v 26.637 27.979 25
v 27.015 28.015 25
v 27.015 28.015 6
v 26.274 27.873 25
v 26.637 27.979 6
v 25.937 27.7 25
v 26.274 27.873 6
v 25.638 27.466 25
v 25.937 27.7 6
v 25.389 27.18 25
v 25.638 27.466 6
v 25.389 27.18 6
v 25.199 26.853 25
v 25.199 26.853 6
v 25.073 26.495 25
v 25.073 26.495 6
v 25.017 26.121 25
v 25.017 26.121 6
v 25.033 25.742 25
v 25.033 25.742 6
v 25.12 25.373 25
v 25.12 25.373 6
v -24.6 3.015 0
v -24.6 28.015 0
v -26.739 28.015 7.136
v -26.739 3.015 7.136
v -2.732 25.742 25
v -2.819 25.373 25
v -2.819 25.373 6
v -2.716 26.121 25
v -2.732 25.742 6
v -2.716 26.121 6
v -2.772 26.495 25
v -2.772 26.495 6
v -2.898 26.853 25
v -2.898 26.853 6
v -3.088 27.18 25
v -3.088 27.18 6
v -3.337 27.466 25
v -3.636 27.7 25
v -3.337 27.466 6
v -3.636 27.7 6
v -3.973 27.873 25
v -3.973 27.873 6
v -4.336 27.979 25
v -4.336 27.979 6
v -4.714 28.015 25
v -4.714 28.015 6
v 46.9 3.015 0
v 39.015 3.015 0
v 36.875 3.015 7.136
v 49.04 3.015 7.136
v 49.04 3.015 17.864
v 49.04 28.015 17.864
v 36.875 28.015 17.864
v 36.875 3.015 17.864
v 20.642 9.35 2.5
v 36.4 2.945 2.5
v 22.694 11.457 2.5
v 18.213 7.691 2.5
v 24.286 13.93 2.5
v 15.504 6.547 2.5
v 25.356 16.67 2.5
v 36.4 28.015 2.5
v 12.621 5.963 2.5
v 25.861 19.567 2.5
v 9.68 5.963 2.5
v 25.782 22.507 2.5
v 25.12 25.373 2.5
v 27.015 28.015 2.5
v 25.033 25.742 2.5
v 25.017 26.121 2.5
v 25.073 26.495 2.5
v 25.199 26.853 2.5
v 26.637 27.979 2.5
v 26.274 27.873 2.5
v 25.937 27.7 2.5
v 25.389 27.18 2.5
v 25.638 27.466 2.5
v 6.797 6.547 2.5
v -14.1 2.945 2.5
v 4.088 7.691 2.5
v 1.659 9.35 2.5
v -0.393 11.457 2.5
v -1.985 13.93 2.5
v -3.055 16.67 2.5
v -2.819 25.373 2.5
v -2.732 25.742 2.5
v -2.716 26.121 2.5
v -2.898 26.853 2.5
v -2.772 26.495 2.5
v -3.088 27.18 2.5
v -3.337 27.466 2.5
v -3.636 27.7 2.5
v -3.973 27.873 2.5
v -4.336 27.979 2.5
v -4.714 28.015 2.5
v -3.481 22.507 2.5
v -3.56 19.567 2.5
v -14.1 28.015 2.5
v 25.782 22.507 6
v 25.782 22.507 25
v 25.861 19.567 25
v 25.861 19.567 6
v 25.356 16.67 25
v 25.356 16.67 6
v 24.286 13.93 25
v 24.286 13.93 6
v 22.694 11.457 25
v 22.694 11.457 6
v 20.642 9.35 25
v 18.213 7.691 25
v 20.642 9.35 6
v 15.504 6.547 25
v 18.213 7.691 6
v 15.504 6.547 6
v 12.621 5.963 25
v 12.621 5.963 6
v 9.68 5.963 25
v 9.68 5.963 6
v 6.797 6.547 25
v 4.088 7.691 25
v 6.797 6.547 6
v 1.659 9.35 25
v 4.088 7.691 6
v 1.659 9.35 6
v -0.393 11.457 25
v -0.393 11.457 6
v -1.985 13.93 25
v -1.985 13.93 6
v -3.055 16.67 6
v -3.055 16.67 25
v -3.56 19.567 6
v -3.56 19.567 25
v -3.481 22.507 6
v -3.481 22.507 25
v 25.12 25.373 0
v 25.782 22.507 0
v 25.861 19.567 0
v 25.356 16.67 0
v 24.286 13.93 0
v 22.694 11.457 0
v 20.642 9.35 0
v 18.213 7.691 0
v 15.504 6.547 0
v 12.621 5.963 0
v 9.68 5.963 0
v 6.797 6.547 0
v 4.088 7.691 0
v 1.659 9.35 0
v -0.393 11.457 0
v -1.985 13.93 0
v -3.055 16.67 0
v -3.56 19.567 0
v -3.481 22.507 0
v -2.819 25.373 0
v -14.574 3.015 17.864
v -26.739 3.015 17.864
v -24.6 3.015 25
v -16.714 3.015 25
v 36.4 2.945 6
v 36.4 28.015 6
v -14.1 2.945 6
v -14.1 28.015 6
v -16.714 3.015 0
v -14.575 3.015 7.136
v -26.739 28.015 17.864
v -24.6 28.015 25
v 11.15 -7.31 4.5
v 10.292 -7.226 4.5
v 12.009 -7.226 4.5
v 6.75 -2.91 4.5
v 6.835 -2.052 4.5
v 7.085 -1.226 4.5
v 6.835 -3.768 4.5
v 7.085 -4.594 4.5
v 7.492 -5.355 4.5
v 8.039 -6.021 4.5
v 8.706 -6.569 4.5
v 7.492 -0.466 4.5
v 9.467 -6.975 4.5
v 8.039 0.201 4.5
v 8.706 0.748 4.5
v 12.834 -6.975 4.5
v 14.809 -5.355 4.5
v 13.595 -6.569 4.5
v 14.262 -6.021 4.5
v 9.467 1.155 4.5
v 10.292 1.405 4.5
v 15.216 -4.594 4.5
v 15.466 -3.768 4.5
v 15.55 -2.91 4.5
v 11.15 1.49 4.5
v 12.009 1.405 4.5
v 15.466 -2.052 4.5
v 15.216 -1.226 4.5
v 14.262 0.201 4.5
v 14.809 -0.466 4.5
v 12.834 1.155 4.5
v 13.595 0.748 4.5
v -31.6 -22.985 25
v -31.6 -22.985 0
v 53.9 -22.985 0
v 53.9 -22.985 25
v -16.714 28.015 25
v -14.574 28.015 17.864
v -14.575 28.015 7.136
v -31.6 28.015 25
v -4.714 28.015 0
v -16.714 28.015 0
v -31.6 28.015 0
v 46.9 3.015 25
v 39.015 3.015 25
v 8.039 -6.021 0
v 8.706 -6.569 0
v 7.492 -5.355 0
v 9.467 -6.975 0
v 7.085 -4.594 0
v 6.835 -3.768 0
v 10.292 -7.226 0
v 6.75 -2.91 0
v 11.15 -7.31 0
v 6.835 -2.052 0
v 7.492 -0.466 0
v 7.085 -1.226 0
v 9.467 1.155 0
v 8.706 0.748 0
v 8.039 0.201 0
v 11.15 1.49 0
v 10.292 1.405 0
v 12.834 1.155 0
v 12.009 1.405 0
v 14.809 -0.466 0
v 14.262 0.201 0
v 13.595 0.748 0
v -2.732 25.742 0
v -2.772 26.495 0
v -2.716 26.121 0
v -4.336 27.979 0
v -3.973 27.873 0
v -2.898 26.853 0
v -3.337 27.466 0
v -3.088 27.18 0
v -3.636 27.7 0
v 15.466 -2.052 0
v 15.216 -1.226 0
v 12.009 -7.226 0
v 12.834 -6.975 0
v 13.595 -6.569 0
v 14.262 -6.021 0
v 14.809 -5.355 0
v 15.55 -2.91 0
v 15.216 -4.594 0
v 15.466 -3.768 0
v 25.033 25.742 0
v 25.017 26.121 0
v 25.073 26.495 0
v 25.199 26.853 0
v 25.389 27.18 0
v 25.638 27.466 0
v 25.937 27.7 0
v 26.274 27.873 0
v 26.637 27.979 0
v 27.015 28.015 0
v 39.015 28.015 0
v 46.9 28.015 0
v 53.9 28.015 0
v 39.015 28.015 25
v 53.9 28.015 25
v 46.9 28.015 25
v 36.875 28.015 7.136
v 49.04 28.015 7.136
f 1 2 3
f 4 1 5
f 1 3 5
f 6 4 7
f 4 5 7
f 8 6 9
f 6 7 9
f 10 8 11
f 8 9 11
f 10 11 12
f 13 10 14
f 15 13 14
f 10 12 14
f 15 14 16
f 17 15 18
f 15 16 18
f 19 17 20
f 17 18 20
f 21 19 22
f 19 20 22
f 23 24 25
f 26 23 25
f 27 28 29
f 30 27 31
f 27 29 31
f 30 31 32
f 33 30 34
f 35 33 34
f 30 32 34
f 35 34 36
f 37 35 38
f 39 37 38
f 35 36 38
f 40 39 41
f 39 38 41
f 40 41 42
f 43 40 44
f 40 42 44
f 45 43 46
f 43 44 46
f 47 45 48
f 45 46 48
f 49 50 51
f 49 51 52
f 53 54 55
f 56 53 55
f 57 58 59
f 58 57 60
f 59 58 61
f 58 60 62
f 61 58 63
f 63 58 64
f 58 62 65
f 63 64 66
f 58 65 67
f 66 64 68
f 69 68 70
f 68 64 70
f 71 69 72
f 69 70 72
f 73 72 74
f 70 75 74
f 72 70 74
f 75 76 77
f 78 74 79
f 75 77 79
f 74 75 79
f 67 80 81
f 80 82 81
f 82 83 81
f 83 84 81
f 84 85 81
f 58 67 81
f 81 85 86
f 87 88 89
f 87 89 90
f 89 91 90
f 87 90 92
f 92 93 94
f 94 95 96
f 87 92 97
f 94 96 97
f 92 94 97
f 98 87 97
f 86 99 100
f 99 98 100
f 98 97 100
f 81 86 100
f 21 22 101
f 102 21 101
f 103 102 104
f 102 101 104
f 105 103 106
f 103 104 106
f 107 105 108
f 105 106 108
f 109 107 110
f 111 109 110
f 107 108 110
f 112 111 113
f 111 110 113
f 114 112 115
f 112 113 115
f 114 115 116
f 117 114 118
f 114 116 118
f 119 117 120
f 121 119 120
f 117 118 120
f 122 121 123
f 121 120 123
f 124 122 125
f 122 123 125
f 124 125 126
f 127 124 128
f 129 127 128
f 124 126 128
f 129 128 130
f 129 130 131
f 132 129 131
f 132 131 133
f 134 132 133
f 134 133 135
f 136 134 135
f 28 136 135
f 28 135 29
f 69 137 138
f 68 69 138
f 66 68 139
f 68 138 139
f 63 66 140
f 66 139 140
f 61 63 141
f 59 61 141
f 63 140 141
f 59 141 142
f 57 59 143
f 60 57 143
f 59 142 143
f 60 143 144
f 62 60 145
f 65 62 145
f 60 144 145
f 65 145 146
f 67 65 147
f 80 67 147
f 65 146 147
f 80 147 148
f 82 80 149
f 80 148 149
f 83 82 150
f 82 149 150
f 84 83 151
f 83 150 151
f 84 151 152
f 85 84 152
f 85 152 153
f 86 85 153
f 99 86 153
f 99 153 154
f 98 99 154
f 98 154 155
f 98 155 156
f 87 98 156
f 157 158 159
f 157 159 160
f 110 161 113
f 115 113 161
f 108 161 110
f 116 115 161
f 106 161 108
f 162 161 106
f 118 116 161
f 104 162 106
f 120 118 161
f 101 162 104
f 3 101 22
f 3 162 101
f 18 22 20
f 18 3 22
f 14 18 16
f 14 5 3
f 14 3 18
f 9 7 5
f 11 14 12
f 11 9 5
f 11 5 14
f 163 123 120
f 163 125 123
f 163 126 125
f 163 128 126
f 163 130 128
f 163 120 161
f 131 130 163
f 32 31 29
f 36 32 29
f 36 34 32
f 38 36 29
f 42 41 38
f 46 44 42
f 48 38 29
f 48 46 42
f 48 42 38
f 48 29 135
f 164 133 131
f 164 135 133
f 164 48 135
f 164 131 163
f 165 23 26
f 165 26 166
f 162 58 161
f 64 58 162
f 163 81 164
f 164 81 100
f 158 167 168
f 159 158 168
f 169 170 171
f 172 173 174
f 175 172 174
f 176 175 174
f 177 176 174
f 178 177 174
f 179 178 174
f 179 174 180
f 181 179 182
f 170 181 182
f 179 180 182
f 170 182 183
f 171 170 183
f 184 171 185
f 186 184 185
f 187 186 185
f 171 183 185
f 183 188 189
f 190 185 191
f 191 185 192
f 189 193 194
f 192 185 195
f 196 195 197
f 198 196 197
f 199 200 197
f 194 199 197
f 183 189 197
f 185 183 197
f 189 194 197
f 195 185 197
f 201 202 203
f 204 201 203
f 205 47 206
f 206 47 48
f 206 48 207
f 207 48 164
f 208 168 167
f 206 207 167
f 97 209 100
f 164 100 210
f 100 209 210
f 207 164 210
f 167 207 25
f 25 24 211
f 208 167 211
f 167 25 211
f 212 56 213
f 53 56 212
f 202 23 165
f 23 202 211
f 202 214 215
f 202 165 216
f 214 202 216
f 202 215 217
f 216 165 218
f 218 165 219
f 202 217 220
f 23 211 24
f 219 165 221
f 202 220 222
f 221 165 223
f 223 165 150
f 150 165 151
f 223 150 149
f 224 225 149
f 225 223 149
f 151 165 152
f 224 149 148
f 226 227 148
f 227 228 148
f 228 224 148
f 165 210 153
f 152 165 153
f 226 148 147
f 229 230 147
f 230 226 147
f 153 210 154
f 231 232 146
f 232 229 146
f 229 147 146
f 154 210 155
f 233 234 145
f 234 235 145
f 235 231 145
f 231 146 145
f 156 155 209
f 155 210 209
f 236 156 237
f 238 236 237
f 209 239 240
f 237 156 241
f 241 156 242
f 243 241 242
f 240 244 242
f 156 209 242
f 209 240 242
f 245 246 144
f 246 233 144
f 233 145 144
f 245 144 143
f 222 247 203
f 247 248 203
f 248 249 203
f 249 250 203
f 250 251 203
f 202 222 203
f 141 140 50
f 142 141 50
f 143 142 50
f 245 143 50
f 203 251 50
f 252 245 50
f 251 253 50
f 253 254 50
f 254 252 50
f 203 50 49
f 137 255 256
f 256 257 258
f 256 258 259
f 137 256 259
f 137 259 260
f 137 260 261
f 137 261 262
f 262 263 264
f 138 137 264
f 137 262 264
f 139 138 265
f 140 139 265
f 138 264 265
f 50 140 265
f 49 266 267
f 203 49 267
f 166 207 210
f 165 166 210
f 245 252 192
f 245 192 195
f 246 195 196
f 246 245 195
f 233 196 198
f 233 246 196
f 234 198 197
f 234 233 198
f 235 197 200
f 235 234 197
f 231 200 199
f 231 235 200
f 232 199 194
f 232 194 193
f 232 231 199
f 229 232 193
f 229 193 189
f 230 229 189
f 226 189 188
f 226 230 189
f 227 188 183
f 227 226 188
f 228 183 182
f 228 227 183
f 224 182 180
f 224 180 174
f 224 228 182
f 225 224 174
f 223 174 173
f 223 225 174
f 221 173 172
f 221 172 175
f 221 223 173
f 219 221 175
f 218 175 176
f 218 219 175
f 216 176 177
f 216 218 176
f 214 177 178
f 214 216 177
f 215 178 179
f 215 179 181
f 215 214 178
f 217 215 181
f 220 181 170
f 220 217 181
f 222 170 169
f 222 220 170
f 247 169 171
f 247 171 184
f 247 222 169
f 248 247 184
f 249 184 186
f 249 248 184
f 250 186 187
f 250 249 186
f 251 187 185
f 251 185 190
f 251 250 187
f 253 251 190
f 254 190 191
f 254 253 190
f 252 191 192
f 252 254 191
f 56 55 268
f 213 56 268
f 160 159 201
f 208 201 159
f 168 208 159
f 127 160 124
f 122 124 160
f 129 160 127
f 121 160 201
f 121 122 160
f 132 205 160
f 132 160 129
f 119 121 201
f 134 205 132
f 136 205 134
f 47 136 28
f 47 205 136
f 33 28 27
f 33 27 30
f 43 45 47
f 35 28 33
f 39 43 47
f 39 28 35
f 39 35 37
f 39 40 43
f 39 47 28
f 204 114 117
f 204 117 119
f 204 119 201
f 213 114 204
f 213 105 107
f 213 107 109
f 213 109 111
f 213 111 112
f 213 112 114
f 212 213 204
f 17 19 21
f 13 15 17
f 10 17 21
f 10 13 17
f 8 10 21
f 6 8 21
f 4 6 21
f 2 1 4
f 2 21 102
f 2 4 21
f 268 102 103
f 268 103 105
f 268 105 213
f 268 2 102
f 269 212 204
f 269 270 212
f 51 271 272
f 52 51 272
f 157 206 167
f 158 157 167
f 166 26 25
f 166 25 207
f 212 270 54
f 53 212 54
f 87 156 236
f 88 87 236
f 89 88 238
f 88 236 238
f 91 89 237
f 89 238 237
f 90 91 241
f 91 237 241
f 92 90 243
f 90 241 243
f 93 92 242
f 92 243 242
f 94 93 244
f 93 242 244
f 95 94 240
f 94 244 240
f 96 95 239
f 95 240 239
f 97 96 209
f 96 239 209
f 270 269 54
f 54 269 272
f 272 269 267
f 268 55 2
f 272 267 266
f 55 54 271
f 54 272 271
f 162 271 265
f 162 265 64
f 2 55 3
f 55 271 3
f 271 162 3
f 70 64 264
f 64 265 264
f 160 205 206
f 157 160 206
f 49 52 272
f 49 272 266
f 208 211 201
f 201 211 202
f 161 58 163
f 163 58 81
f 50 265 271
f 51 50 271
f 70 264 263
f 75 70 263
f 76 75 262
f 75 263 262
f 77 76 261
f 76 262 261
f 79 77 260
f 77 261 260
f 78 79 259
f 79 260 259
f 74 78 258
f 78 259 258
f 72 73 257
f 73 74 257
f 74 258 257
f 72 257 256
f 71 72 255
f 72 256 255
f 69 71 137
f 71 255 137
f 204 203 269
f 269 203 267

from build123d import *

# Parameters (mm, degrees)
BOSS_EXTRUDE1_DEPTH = 25
CUT_EXTRUDE3_START  = -25
SKETCH5_R           = 4.4
CUT_EXTRUDE3_DEPTH  = 4.5
SKETCH6_OUTSIDE_W   = 108.03
SKETCH6_OUTSIDE_H   = 47.53
CUT_EXTRUDE4_DEPTH  = 25
SKETCH8_W           = 50.5
SKETCH8_H           = 25.070079704
CUT_EXTRUDE5_DEPTH  = 3.5


with BuildPart() as part:
    # Sketch2 → Boss-Extrude1 (new body)
    with BuildSketch(Plane.XY):
        with BuildLine():
            Line((53.900497512, 28.014925373), (27.014667046, 28.014925373))
            ThreePointArc((27.014667046, 28.014925373), (25.389308303, 27.180347595), (25.120437848, 25.373134328))
            ThreePointArc((25.120437848, 25.373134328), (11.150497512, 5.889925373), (-2.819442823, 25.373134328))
            ThreePointArc((-2.819442823, 25.373134328), (-3.088313278, 27.180347595), (-4.713672021, 28.014925373))
            Line((-4.713672021, 28.014925373), (-31.599502488, 28.014925373))
            Line((-31.599502488, 28.014925373), (-31.599502488, -22.985074627))
            Line((-31.599502488, -22.985074627), (53.900497512, -22.985074627))
            Line((53.900497512, -22.985074627), (53.900497512, 28.014925373))
        make_face()
    extrude(amount=BOSS_EXTRUDE1_DEPTH)

    # Sketch5 → Cut-Extrude3 (cut)
    with BuildSketch(Plane.XY.offset(25).offset(CUT_EXTRUDE3_START)):
        with Locations((11.150497512, -2.910074627)):
            Circle(SKETCH5_R)
    extrude(amount=CUT_EXTRUDE3_DEPTH, mode=Mode.SUBTRACT)

    # Sketch6 outside → Cut-Extrude4 (cut)
    with BuildSketch(Plane(origin=(0, 28.014925373, 0), x_dir=(1, 0, 0), z_dir=(0, 1, 0))):
        with Locations((11.15, -12.5)):
            Rectangle(SKETCH6_OUTSIDE_W, SKETCH6_OUTSIDE_H)
        Polygon((-24.599502488, 0), (-26.73851519, -7.13632431), (-14.574659319, -7.13632431), (-16.713672021, 0), (-4.713672021, 0), (27.014667046, 0), (39.014667046, 0), (36.875076634, -7.136151124), (49.040087925, -7.136151124), (46.900497512, 0), (53.900497512, 0), (53.900497512, -25), (46.900497512, -25), (49.040087925, -17.863848876), (36.875076634, -17.863848876), (39.014667046, -25), (27.014667046, -25), (-4.713672021, -25), (-16.713672021, -25), (-14.574081609, -17.863848876), (-26.7390929, -17.863848876), (-24.599502488, -25), (-31.599502488, -25), (-31.599502488, 0), align=None, mode=Mode.SUBTRACT)
    extrude(amount=-CUT_EXTRUDE4_DEPTH, mode=Mode.SUBTRACT)

    # Sketch8 → Cut-Extrude5 (cut)
    with BuildSketch(Plane(origin=(0, 0, 2.5), x_dir=(-1, 0, 0), z_dir=(0, 0, -1))):
        with Locations((-11.150497512, 15.479885521)):
            Rectangle(SKETCH8_W, SKETCH8_H)
    extrude(amount=-CUT_EXTRUDE5_DEPTH, mode=Mode.SUBTRACT)


solid = part.part
